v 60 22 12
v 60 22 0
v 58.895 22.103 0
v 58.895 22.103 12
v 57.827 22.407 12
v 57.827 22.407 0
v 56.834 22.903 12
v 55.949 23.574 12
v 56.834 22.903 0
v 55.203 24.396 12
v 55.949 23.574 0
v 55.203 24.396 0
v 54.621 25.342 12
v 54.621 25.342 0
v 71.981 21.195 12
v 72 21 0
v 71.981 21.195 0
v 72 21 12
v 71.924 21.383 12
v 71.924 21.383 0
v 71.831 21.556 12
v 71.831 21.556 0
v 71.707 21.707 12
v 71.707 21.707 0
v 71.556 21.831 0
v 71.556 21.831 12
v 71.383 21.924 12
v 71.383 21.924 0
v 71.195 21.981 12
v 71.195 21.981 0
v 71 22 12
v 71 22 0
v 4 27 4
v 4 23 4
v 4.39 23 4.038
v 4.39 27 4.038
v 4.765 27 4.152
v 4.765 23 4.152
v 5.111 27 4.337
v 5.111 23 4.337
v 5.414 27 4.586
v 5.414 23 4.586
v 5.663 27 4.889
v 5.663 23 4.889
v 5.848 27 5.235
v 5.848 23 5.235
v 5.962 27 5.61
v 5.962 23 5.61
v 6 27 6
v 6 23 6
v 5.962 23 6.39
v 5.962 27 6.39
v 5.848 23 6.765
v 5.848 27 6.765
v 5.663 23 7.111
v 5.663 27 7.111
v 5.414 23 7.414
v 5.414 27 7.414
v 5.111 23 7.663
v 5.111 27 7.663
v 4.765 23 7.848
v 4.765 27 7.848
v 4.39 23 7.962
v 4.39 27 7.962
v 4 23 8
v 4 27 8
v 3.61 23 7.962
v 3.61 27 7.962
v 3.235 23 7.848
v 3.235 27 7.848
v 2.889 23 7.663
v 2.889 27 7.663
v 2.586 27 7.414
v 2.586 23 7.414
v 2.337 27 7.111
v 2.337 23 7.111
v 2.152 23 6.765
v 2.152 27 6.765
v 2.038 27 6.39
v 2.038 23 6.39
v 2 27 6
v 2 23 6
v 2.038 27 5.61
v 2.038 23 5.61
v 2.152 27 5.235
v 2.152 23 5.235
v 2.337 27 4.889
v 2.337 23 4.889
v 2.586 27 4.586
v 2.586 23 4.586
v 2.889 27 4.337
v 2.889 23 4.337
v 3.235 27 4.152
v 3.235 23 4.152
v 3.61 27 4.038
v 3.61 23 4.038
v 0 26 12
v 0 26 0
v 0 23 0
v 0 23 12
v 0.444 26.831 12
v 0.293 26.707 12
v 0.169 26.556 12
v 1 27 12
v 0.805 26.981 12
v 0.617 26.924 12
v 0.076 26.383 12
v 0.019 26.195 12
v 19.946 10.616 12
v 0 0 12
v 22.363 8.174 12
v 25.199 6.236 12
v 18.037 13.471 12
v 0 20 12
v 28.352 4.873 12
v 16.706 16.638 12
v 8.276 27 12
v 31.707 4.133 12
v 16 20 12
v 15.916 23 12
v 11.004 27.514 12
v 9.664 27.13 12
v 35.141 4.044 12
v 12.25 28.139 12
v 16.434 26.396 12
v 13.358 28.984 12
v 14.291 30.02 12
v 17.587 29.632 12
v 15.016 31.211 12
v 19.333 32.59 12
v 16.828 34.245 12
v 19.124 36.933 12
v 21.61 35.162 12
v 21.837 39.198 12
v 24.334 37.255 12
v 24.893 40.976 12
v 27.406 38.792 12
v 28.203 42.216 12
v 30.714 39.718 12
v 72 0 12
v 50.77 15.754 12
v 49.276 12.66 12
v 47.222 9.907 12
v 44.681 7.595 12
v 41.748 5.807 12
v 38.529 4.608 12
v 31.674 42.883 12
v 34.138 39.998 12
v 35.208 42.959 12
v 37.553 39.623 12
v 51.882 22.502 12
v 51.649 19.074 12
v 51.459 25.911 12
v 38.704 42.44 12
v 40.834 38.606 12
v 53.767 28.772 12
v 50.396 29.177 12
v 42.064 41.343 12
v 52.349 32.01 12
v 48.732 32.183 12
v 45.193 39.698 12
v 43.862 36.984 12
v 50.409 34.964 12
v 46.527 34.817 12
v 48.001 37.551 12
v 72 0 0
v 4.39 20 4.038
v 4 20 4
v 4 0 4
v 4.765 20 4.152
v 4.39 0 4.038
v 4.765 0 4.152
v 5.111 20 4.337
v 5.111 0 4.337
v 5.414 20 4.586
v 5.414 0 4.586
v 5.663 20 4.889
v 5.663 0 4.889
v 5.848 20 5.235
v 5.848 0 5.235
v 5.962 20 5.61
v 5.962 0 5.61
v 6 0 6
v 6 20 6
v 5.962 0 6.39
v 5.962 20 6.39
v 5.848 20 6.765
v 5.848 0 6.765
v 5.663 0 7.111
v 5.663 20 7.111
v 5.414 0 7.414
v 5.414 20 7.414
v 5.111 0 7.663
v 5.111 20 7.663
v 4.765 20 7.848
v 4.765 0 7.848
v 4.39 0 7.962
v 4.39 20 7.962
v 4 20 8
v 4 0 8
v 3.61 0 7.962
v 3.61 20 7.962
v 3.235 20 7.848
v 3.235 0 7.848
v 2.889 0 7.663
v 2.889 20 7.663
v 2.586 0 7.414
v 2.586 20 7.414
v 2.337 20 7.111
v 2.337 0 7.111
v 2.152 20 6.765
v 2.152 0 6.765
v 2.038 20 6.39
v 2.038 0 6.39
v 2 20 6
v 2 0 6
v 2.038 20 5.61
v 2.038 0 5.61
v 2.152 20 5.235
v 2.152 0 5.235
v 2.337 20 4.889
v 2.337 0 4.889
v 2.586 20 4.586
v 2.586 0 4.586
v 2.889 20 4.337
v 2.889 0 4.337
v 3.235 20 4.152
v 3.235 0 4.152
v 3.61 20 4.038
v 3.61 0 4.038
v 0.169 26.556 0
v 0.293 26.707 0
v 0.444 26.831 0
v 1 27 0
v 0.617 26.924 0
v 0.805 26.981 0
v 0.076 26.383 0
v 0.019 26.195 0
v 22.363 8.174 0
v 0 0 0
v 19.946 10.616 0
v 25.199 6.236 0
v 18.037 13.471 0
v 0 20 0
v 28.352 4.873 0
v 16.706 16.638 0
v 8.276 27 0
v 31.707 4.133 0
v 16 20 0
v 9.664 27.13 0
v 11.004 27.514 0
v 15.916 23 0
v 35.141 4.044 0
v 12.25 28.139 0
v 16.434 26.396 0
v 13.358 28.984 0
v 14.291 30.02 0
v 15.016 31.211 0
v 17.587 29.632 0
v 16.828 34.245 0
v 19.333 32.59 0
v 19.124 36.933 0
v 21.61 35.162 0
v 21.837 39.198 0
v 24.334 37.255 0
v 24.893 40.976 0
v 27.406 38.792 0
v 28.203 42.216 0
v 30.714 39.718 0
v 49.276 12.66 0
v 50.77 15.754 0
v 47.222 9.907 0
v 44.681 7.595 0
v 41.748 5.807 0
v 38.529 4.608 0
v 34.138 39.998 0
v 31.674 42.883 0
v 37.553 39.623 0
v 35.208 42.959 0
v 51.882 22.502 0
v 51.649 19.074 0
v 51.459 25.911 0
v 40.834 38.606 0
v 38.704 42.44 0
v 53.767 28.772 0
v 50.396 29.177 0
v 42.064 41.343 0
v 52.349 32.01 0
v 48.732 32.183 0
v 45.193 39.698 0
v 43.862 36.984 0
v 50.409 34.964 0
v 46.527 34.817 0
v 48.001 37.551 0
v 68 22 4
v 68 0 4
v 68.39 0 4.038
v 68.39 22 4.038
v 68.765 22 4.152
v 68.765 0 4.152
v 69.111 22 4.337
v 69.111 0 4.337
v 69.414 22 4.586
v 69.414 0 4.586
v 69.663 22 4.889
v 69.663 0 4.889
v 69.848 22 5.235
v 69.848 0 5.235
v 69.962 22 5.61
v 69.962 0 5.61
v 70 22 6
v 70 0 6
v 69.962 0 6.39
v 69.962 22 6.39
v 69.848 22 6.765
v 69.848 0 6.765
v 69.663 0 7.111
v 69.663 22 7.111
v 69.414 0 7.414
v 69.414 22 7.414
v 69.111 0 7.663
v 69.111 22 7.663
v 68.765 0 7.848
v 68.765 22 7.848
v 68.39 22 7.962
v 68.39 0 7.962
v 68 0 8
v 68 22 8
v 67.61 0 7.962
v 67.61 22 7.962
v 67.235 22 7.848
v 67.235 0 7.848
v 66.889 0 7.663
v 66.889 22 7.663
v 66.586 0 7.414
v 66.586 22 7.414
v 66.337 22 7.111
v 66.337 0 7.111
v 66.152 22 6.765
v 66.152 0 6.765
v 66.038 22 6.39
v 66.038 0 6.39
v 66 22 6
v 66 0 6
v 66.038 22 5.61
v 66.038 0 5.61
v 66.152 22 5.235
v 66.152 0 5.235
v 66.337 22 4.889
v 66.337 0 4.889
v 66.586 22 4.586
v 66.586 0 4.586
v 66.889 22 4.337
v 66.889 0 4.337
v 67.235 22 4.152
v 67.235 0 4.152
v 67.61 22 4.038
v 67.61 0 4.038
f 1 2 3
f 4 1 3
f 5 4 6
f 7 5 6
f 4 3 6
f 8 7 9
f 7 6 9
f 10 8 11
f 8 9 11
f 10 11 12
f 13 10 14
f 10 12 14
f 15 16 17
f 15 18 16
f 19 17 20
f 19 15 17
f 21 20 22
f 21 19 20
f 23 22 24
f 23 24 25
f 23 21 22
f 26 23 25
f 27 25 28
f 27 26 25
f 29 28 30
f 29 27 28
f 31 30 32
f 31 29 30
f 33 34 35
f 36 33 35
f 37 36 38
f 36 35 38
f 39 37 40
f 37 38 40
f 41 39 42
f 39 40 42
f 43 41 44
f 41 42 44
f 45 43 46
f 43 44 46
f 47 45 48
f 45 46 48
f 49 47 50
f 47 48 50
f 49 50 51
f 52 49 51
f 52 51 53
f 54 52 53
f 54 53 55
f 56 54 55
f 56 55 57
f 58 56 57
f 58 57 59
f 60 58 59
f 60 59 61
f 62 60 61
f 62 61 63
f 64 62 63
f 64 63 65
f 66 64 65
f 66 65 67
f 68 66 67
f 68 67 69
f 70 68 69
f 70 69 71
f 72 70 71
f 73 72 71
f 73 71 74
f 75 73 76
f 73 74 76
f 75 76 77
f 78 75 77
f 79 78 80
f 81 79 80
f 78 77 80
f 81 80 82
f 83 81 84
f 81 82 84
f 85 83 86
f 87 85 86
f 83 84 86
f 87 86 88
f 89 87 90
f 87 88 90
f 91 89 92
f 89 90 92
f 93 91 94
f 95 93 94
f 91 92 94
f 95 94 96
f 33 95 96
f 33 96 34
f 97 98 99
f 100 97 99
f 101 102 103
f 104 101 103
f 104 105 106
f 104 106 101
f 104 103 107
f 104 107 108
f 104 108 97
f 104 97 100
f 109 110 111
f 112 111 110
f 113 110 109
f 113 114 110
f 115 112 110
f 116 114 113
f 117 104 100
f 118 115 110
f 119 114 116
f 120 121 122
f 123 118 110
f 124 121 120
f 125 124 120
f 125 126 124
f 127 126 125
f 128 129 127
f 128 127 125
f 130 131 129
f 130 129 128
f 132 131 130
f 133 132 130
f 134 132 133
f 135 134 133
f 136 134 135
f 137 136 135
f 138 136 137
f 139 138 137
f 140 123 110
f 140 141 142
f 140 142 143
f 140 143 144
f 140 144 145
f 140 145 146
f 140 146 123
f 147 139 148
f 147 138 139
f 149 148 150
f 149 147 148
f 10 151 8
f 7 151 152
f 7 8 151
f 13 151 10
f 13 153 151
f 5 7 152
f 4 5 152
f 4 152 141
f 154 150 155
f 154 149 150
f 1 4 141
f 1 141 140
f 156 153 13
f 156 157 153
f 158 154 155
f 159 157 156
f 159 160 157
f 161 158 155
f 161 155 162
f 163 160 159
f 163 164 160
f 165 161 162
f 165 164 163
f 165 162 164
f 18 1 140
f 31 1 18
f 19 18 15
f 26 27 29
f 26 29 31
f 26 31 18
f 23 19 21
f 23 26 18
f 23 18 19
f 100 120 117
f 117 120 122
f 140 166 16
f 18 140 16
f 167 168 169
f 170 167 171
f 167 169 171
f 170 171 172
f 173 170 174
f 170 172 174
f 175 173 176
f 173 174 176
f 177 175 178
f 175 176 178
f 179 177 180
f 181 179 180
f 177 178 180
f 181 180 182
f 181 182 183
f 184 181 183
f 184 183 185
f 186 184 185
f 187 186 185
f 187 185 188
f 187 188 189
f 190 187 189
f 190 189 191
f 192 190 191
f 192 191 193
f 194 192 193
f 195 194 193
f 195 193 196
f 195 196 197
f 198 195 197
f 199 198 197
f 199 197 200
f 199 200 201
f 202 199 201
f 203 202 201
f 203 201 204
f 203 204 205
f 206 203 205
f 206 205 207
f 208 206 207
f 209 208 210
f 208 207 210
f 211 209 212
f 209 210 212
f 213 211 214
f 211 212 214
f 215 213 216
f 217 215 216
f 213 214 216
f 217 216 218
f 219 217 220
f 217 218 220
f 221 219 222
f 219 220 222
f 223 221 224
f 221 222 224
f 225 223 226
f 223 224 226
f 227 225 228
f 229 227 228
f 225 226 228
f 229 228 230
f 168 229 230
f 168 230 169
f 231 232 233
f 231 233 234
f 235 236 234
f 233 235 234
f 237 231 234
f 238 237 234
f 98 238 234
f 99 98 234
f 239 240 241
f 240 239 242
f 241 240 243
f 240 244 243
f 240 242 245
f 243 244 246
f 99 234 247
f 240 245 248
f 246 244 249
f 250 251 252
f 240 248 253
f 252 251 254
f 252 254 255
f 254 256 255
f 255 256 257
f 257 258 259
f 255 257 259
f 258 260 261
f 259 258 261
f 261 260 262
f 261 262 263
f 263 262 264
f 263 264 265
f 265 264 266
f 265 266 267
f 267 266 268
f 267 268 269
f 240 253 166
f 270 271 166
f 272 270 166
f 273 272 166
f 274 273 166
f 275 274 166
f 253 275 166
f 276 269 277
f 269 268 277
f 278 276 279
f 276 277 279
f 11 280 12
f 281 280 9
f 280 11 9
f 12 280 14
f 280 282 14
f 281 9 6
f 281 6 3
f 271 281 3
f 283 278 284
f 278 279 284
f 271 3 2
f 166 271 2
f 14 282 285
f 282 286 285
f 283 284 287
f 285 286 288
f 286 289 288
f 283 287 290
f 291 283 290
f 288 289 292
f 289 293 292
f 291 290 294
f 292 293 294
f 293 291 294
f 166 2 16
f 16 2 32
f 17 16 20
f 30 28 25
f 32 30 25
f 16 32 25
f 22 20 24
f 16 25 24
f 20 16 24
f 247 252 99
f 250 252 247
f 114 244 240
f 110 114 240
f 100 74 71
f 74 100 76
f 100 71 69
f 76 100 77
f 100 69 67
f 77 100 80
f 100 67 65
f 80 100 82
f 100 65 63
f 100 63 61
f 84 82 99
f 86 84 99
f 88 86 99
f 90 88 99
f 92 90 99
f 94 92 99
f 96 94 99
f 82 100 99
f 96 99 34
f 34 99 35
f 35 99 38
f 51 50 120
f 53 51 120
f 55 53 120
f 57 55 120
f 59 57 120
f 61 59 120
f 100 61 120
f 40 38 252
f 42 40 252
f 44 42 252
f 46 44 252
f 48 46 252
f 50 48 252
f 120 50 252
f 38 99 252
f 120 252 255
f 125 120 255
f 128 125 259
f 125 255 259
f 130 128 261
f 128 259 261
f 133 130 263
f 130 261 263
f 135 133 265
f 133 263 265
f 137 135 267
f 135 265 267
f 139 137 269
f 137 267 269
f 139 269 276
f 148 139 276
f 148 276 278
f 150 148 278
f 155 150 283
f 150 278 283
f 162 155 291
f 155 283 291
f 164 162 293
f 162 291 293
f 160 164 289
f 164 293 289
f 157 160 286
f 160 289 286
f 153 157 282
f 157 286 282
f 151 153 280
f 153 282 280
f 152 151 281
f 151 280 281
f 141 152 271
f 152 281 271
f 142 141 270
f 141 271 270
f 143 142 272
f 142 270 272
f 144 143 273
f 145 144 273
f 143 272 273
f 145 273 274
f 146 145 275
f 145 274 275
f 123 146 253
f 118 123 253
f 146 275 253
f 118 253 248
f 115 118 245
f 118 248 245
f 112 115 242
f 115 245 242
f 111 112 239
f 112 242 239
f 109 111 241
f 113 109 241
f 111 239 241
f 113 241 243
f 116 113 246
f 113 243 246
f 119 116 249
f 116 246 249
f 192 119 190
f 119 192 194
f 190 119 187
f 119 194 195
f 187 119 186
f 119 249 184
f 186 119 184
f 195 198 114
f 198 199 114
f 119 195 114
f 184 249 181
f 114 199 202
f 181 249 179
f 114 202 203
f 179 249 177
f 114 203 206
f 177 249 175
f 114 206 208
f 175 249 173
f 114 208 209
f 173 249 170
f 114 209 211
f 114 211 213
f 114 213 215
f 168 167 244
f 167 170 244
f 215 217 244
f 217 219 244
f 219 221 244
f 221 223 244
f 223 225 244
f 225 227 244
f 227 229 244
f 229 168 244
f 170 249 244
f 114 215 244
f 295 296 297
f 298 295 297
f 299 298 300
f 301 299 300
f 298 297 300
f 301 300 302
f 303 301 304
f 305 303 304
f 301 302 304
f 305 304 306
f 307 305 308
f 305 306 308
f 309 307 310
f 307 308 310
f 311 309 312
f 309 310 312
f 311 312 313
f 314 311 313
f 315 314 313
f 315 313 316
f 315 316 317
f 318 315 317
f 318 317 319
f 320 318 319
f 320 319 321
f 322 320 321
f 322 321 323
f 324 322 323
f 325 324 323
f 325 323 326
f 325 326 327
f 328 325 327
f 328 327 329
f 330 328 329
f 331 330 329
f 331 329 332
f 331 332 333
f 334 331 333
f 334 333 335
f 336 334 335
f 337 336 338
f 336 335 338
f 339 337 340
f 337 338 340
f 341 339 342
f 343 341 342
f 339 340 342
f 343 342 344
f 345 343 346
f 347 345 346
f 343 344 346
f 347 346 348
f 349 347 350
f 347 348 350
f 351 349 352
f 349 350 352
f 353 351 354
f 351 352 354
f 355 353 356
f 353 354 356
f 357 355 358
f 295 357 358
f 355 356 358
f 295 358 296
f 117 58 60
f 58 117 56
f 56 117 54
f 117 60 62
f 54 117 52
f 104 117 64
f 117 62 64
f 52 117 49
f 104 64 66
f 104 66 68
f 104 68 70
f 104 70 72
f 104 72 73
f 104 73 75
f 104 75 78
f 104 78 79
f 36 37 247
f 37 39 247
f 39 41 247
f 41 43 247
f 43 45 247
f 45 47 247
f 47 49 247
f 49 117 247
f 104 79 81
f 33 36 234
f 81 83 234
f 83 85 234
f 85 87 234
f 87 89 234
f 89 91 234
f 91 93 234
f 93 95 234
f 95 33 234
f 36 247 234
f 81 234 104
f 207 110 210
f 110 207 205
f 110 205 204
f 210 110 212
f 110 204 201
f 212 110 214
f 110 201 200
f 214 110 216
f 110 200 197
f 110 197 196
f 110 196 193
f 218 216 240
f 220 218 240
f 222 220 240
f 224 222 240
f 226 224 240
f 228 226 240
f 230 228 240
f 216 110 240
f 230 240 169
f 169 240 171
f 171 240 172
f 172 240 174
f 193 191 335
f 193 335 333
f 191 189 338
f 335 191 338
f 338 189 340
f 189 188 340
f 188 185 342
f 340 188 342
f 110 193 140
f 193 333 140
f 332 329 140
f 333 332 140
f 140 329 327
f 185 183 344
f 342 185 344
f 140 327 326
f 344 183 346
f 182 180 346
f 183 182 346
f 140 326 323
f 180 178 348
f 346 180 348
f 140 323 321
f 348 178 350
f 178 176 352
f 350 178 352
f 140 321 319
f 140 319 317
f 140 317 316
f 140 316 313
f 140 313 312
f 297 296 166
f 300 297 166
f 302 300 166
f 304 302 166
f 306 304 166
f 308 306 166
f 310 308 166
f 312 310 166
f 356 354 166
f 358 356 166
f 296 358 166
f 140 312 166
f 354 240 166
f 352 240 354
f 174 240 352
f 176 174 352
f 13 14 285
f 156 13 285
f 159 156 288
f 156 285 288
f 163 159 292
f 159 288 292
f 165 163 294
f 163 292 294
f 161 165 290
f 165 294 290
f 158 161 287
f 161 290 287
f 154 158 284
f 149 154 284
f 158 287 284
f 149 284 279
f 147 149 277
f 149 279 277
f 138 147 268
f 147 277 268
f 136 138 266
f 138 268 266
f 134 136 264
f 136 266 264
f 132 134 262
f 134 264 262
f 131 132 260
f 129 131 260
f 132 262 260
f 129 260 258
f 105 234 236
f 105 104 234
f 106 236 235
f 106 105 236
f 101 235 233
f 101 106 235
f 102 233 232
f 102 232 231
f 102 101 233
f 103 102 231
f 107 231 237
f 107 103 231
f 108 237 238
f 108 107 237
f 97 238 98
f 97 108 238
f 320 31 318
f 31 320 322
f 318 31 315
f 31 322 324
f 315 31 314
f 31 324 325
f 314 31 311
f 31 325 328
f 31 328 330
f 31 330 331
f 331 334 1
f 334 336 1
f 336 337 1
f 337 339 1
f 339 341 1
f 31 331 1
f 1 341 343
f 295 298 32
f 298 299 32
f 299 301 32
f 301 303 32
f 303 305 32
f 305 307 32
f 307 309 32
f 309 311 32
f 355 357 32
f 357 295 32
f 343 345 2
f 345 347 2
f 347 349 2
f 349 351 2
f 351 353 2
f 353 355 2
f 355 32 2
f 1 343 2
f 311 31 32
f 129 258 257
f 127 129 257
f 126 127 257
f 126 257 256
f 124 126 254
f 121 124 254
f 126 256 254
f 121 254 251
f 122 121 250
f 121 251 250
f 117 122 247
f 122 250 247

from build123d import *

# Parameters (mm, degrees)
BOSS_EXTRU_1_DEPTH      = 12
ESQUISSE2_R             = 2
ENL_V_MAT_EXTRU_2_DEPTH = 85.717176535
ESQUISSE2_4_R           = 2
ENL_V_MAT_EXTRU_3_DEPTH = 32
CONG_1_R                = 1


with BuildPart() as part:
    # Esquisse1 → Boss.-Extru.1 (new body)
    with BuildSketch(Plane.XY):
        with BuildLine():
            Line((0, 0), (72, 0))
            Line((72, 0), (72, 22))
            Line((72, 22), (60, 22))
            ThreePointArc((60, 22), (56.833671471, 22.903494958), (54.620930228, 25.341878785))
            ThreePointArc((54.620930228, 25.341878785), (36.966721004, 42.773175617), (15.016177647, 31.210526316))
            ThreePointArc((15.016177647, 31.210526316), (12.249643941, 28.139141071), (8.27604687, 27))
            Line((8.27604687, 27), (0, 27))
            Line((0, 27), (0, 23))
            Line((0, 23), (15.916343064, 23))
            ThreePointArc((15.916343064, 23), (51.881549416, 22.50174657), (16, 20))
            Line((16, 20), (0, 20))
            Line((0, 20), (0, 0))
        make_face()
    extrude(amount=BOSS_EXTRU_1_DEPTH)

    # Esquisse2 → Enlèv. mat.-Extru.2 (cut, through all)
    with BuildSketch(Plane(origin=(0, 0, 0), x_dir=(-1, 0, 0), z_dir=(0, -1, 0))):
        with Locations((-4, -6)):
            Circle(ESQUISSE2_R)
    extrude(amount=-ENL_V_MAT_EXTRU_2_DEPTH, mode=Mode.SUBTRACT)

    # Esquisse2<4> → Enlèv. mat.-Extru.3 (cut)
    with BuildSketch(Plane(origin=(0, 0, 0), x_dir=(-1, 0, 0), z_dir=(0, -1, 0))):
        with Locations((-4, -6)):
            Circle(ESQUISSE2_4_R)
        with Locations((-68, -6)):
            Circle(ESQUISSE2_4_R)
    extrude(amount=-ENL_V_MAT_EXTRU_3_DEPTH, mode=Mode.SUBTRACT)

    # Congé1
    cong_1_edges = [part.edges().sort_by_distance(p)[0] for p in [
        (0, 27, 6),
        (72, 22, 6),
    ]]
    fillet(cong_1_edges, radius=CONG_1_R)


solid = part.part
